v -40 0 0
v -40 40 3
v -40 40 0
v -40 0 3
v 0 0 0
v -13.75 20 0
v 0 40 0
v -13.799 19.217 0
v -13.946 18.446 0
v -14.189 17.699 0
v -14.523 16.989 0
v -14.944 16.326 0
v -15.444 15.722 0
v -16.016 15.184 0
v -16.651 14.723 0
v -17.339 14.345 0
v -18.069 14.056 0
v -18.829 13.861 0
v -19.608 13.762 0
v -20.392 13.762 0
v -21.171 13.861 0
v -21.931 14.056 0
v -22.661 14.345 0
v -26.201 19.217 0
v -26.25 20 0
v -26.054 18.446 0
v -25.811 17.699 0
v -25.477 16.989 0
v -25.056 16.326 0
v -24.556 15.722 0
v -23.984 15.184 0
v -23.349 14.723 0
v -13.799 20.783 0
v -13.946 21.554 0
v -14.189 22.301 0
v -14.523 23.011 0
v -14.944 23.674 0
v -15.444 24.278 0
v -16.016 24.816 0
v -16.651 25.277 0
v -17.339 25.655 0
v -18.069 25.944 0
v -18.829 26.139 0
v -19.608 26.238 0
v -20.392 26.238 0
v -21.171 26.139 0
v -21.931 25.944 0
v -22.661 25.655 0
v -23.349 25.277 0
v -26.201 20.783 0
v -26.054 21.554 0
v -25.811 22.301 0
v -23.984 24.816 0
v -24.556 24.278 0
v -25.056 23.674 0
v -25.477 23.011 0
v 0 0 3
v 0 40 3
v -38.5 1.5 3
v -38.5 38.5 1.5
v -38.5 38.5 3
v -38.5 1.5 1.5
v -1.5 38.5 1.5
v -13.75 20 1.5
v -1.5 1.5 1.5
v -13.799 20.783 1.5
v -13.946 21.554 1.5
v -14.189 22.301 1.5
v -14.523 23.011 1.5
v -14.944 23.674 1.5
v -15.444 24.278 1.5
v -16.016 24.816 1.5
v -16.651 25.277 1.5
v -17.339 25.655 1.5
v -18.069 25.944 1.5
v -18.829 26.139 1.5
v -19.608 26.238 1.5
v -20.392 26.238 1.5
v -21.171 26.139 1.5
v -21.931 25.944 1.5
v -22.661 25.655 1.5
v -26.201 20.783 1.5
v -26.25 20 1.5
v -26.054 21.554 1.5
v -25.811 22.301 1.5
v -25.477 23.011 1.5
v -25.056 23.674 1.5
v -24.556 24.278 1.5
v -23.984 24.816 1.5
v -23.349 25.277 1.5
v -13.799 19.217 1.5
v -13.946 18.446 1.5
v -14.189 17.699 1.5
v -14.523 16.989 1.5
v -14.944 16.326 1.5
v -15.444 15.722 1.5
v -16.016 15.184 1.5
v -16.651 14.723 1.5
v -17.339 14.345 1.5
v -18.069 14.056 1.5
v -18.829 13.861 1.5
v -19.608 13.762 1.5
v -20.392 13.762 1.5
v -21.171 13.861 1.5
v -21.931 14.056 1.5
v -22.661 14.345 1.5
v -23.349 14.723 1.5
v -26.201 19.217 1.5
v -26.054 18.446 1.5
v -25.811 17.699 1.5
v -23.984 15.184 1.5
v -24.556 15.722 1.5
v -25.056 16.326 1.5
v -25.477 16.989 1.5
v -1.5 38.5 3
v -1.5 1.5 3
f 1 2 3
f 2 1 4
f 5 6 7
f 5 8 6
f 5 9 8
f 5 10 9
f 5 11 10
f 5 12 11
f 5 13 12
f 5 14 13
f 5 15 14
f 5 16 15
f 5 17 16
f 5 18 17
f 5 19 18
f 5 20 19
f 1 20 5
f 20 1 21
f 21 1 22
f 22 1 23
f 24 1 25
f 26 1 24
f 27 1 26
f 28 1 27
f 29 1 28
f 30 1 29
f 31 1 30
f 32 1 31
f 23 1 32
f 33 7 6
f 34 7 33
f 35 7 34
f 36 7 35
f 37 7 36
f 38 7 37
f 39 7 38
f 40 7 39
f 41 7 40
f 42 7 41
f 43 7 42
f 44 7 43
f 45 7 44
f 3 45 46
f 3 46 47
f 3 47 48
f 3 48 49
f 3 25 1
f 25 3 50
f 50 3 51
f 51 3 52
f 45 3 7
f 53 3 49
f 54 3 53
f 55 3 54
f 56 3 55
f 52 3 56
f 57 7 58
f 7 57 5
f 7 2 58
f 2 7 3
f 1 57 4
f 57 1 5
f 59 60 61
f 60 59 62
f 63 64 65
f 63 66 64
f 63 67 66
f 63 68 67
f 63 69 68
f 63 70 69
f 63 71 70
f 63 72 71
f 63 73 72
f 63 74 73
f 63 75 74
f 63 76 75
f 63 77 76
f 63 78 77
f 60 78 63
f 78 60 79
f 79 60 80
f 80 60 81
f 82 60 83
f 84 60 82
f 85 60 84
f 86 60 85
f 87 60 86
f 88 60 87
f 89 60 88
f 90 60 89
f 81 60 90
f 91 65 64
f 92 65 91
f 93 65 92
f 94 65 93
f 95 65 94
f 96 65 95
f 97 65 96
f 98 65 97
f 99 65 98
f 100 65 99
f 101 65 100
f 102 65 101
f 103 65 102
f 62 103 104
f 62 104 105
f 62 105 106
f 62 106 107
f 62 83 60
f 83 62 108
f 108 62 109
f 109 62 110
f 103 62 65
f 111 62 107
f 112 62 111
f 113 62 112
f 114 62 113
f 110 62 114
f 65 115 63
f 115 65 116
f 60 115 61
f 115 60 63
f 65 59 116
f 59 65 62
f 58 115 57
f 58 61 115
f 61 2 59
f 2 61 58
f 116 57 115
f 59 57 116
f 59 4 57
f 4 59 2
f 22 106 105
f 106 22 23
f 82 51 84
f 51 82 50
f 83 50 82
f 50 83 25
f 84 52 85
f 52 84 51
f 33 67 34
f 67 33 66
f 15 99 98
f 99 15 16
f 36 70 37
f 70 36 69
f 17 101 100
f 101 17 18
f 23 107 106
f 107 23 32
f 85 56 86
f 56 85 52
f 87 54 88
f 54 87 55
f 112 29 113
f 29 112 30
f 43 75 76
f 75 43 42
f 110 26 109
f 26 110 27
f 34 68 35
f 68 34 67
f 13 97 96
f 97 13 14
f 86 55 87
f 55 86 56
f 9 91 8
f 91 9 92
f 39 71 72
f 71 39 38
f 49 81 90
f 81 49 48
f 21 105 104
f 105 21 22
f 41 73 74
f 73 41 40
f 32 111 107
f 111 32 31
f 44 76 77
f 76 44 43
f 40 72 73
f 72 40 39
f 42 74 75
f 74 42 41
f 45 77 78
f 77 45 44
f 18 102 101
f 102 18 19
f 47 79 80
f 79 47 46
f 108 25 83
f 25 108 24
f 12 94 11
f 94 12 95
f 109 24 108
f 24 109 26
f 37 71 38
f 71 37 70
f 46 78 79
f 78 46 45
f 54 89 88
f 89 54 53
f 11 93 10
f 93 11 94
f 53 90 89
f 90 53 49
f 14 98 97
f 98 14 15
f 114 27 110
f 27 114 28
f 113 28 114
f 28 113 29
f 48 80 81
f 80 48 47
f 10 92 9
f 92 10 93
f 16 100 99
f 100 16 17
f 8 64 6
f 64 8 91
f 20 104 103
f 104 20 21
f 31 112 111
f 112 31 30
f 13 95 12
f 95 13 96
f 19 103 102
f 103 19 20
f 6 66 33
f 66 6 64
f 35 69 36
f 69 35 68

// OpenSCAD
$fn=50;
e=0.1;

body_size=40;
thickness=1.5;
hole_size=12.5;
box_height=3;

rotate(a=[0,180,0])
translate([0,0,-(body_size)])
difference() {
    cube(body_size);

    translate([thickness, thickness, thickness])
    cube(body_size-thickness*2);
    
    translate([-e,-e,-e])
    cube([body_size+e*2, body_size+e*2, body_size-box_height+e]);
    
    translate([body_size/2,body_size/2,body_size-thickness-e])
    cylinder(h=thickness*2+e*2, r=hole_size/2);
}
